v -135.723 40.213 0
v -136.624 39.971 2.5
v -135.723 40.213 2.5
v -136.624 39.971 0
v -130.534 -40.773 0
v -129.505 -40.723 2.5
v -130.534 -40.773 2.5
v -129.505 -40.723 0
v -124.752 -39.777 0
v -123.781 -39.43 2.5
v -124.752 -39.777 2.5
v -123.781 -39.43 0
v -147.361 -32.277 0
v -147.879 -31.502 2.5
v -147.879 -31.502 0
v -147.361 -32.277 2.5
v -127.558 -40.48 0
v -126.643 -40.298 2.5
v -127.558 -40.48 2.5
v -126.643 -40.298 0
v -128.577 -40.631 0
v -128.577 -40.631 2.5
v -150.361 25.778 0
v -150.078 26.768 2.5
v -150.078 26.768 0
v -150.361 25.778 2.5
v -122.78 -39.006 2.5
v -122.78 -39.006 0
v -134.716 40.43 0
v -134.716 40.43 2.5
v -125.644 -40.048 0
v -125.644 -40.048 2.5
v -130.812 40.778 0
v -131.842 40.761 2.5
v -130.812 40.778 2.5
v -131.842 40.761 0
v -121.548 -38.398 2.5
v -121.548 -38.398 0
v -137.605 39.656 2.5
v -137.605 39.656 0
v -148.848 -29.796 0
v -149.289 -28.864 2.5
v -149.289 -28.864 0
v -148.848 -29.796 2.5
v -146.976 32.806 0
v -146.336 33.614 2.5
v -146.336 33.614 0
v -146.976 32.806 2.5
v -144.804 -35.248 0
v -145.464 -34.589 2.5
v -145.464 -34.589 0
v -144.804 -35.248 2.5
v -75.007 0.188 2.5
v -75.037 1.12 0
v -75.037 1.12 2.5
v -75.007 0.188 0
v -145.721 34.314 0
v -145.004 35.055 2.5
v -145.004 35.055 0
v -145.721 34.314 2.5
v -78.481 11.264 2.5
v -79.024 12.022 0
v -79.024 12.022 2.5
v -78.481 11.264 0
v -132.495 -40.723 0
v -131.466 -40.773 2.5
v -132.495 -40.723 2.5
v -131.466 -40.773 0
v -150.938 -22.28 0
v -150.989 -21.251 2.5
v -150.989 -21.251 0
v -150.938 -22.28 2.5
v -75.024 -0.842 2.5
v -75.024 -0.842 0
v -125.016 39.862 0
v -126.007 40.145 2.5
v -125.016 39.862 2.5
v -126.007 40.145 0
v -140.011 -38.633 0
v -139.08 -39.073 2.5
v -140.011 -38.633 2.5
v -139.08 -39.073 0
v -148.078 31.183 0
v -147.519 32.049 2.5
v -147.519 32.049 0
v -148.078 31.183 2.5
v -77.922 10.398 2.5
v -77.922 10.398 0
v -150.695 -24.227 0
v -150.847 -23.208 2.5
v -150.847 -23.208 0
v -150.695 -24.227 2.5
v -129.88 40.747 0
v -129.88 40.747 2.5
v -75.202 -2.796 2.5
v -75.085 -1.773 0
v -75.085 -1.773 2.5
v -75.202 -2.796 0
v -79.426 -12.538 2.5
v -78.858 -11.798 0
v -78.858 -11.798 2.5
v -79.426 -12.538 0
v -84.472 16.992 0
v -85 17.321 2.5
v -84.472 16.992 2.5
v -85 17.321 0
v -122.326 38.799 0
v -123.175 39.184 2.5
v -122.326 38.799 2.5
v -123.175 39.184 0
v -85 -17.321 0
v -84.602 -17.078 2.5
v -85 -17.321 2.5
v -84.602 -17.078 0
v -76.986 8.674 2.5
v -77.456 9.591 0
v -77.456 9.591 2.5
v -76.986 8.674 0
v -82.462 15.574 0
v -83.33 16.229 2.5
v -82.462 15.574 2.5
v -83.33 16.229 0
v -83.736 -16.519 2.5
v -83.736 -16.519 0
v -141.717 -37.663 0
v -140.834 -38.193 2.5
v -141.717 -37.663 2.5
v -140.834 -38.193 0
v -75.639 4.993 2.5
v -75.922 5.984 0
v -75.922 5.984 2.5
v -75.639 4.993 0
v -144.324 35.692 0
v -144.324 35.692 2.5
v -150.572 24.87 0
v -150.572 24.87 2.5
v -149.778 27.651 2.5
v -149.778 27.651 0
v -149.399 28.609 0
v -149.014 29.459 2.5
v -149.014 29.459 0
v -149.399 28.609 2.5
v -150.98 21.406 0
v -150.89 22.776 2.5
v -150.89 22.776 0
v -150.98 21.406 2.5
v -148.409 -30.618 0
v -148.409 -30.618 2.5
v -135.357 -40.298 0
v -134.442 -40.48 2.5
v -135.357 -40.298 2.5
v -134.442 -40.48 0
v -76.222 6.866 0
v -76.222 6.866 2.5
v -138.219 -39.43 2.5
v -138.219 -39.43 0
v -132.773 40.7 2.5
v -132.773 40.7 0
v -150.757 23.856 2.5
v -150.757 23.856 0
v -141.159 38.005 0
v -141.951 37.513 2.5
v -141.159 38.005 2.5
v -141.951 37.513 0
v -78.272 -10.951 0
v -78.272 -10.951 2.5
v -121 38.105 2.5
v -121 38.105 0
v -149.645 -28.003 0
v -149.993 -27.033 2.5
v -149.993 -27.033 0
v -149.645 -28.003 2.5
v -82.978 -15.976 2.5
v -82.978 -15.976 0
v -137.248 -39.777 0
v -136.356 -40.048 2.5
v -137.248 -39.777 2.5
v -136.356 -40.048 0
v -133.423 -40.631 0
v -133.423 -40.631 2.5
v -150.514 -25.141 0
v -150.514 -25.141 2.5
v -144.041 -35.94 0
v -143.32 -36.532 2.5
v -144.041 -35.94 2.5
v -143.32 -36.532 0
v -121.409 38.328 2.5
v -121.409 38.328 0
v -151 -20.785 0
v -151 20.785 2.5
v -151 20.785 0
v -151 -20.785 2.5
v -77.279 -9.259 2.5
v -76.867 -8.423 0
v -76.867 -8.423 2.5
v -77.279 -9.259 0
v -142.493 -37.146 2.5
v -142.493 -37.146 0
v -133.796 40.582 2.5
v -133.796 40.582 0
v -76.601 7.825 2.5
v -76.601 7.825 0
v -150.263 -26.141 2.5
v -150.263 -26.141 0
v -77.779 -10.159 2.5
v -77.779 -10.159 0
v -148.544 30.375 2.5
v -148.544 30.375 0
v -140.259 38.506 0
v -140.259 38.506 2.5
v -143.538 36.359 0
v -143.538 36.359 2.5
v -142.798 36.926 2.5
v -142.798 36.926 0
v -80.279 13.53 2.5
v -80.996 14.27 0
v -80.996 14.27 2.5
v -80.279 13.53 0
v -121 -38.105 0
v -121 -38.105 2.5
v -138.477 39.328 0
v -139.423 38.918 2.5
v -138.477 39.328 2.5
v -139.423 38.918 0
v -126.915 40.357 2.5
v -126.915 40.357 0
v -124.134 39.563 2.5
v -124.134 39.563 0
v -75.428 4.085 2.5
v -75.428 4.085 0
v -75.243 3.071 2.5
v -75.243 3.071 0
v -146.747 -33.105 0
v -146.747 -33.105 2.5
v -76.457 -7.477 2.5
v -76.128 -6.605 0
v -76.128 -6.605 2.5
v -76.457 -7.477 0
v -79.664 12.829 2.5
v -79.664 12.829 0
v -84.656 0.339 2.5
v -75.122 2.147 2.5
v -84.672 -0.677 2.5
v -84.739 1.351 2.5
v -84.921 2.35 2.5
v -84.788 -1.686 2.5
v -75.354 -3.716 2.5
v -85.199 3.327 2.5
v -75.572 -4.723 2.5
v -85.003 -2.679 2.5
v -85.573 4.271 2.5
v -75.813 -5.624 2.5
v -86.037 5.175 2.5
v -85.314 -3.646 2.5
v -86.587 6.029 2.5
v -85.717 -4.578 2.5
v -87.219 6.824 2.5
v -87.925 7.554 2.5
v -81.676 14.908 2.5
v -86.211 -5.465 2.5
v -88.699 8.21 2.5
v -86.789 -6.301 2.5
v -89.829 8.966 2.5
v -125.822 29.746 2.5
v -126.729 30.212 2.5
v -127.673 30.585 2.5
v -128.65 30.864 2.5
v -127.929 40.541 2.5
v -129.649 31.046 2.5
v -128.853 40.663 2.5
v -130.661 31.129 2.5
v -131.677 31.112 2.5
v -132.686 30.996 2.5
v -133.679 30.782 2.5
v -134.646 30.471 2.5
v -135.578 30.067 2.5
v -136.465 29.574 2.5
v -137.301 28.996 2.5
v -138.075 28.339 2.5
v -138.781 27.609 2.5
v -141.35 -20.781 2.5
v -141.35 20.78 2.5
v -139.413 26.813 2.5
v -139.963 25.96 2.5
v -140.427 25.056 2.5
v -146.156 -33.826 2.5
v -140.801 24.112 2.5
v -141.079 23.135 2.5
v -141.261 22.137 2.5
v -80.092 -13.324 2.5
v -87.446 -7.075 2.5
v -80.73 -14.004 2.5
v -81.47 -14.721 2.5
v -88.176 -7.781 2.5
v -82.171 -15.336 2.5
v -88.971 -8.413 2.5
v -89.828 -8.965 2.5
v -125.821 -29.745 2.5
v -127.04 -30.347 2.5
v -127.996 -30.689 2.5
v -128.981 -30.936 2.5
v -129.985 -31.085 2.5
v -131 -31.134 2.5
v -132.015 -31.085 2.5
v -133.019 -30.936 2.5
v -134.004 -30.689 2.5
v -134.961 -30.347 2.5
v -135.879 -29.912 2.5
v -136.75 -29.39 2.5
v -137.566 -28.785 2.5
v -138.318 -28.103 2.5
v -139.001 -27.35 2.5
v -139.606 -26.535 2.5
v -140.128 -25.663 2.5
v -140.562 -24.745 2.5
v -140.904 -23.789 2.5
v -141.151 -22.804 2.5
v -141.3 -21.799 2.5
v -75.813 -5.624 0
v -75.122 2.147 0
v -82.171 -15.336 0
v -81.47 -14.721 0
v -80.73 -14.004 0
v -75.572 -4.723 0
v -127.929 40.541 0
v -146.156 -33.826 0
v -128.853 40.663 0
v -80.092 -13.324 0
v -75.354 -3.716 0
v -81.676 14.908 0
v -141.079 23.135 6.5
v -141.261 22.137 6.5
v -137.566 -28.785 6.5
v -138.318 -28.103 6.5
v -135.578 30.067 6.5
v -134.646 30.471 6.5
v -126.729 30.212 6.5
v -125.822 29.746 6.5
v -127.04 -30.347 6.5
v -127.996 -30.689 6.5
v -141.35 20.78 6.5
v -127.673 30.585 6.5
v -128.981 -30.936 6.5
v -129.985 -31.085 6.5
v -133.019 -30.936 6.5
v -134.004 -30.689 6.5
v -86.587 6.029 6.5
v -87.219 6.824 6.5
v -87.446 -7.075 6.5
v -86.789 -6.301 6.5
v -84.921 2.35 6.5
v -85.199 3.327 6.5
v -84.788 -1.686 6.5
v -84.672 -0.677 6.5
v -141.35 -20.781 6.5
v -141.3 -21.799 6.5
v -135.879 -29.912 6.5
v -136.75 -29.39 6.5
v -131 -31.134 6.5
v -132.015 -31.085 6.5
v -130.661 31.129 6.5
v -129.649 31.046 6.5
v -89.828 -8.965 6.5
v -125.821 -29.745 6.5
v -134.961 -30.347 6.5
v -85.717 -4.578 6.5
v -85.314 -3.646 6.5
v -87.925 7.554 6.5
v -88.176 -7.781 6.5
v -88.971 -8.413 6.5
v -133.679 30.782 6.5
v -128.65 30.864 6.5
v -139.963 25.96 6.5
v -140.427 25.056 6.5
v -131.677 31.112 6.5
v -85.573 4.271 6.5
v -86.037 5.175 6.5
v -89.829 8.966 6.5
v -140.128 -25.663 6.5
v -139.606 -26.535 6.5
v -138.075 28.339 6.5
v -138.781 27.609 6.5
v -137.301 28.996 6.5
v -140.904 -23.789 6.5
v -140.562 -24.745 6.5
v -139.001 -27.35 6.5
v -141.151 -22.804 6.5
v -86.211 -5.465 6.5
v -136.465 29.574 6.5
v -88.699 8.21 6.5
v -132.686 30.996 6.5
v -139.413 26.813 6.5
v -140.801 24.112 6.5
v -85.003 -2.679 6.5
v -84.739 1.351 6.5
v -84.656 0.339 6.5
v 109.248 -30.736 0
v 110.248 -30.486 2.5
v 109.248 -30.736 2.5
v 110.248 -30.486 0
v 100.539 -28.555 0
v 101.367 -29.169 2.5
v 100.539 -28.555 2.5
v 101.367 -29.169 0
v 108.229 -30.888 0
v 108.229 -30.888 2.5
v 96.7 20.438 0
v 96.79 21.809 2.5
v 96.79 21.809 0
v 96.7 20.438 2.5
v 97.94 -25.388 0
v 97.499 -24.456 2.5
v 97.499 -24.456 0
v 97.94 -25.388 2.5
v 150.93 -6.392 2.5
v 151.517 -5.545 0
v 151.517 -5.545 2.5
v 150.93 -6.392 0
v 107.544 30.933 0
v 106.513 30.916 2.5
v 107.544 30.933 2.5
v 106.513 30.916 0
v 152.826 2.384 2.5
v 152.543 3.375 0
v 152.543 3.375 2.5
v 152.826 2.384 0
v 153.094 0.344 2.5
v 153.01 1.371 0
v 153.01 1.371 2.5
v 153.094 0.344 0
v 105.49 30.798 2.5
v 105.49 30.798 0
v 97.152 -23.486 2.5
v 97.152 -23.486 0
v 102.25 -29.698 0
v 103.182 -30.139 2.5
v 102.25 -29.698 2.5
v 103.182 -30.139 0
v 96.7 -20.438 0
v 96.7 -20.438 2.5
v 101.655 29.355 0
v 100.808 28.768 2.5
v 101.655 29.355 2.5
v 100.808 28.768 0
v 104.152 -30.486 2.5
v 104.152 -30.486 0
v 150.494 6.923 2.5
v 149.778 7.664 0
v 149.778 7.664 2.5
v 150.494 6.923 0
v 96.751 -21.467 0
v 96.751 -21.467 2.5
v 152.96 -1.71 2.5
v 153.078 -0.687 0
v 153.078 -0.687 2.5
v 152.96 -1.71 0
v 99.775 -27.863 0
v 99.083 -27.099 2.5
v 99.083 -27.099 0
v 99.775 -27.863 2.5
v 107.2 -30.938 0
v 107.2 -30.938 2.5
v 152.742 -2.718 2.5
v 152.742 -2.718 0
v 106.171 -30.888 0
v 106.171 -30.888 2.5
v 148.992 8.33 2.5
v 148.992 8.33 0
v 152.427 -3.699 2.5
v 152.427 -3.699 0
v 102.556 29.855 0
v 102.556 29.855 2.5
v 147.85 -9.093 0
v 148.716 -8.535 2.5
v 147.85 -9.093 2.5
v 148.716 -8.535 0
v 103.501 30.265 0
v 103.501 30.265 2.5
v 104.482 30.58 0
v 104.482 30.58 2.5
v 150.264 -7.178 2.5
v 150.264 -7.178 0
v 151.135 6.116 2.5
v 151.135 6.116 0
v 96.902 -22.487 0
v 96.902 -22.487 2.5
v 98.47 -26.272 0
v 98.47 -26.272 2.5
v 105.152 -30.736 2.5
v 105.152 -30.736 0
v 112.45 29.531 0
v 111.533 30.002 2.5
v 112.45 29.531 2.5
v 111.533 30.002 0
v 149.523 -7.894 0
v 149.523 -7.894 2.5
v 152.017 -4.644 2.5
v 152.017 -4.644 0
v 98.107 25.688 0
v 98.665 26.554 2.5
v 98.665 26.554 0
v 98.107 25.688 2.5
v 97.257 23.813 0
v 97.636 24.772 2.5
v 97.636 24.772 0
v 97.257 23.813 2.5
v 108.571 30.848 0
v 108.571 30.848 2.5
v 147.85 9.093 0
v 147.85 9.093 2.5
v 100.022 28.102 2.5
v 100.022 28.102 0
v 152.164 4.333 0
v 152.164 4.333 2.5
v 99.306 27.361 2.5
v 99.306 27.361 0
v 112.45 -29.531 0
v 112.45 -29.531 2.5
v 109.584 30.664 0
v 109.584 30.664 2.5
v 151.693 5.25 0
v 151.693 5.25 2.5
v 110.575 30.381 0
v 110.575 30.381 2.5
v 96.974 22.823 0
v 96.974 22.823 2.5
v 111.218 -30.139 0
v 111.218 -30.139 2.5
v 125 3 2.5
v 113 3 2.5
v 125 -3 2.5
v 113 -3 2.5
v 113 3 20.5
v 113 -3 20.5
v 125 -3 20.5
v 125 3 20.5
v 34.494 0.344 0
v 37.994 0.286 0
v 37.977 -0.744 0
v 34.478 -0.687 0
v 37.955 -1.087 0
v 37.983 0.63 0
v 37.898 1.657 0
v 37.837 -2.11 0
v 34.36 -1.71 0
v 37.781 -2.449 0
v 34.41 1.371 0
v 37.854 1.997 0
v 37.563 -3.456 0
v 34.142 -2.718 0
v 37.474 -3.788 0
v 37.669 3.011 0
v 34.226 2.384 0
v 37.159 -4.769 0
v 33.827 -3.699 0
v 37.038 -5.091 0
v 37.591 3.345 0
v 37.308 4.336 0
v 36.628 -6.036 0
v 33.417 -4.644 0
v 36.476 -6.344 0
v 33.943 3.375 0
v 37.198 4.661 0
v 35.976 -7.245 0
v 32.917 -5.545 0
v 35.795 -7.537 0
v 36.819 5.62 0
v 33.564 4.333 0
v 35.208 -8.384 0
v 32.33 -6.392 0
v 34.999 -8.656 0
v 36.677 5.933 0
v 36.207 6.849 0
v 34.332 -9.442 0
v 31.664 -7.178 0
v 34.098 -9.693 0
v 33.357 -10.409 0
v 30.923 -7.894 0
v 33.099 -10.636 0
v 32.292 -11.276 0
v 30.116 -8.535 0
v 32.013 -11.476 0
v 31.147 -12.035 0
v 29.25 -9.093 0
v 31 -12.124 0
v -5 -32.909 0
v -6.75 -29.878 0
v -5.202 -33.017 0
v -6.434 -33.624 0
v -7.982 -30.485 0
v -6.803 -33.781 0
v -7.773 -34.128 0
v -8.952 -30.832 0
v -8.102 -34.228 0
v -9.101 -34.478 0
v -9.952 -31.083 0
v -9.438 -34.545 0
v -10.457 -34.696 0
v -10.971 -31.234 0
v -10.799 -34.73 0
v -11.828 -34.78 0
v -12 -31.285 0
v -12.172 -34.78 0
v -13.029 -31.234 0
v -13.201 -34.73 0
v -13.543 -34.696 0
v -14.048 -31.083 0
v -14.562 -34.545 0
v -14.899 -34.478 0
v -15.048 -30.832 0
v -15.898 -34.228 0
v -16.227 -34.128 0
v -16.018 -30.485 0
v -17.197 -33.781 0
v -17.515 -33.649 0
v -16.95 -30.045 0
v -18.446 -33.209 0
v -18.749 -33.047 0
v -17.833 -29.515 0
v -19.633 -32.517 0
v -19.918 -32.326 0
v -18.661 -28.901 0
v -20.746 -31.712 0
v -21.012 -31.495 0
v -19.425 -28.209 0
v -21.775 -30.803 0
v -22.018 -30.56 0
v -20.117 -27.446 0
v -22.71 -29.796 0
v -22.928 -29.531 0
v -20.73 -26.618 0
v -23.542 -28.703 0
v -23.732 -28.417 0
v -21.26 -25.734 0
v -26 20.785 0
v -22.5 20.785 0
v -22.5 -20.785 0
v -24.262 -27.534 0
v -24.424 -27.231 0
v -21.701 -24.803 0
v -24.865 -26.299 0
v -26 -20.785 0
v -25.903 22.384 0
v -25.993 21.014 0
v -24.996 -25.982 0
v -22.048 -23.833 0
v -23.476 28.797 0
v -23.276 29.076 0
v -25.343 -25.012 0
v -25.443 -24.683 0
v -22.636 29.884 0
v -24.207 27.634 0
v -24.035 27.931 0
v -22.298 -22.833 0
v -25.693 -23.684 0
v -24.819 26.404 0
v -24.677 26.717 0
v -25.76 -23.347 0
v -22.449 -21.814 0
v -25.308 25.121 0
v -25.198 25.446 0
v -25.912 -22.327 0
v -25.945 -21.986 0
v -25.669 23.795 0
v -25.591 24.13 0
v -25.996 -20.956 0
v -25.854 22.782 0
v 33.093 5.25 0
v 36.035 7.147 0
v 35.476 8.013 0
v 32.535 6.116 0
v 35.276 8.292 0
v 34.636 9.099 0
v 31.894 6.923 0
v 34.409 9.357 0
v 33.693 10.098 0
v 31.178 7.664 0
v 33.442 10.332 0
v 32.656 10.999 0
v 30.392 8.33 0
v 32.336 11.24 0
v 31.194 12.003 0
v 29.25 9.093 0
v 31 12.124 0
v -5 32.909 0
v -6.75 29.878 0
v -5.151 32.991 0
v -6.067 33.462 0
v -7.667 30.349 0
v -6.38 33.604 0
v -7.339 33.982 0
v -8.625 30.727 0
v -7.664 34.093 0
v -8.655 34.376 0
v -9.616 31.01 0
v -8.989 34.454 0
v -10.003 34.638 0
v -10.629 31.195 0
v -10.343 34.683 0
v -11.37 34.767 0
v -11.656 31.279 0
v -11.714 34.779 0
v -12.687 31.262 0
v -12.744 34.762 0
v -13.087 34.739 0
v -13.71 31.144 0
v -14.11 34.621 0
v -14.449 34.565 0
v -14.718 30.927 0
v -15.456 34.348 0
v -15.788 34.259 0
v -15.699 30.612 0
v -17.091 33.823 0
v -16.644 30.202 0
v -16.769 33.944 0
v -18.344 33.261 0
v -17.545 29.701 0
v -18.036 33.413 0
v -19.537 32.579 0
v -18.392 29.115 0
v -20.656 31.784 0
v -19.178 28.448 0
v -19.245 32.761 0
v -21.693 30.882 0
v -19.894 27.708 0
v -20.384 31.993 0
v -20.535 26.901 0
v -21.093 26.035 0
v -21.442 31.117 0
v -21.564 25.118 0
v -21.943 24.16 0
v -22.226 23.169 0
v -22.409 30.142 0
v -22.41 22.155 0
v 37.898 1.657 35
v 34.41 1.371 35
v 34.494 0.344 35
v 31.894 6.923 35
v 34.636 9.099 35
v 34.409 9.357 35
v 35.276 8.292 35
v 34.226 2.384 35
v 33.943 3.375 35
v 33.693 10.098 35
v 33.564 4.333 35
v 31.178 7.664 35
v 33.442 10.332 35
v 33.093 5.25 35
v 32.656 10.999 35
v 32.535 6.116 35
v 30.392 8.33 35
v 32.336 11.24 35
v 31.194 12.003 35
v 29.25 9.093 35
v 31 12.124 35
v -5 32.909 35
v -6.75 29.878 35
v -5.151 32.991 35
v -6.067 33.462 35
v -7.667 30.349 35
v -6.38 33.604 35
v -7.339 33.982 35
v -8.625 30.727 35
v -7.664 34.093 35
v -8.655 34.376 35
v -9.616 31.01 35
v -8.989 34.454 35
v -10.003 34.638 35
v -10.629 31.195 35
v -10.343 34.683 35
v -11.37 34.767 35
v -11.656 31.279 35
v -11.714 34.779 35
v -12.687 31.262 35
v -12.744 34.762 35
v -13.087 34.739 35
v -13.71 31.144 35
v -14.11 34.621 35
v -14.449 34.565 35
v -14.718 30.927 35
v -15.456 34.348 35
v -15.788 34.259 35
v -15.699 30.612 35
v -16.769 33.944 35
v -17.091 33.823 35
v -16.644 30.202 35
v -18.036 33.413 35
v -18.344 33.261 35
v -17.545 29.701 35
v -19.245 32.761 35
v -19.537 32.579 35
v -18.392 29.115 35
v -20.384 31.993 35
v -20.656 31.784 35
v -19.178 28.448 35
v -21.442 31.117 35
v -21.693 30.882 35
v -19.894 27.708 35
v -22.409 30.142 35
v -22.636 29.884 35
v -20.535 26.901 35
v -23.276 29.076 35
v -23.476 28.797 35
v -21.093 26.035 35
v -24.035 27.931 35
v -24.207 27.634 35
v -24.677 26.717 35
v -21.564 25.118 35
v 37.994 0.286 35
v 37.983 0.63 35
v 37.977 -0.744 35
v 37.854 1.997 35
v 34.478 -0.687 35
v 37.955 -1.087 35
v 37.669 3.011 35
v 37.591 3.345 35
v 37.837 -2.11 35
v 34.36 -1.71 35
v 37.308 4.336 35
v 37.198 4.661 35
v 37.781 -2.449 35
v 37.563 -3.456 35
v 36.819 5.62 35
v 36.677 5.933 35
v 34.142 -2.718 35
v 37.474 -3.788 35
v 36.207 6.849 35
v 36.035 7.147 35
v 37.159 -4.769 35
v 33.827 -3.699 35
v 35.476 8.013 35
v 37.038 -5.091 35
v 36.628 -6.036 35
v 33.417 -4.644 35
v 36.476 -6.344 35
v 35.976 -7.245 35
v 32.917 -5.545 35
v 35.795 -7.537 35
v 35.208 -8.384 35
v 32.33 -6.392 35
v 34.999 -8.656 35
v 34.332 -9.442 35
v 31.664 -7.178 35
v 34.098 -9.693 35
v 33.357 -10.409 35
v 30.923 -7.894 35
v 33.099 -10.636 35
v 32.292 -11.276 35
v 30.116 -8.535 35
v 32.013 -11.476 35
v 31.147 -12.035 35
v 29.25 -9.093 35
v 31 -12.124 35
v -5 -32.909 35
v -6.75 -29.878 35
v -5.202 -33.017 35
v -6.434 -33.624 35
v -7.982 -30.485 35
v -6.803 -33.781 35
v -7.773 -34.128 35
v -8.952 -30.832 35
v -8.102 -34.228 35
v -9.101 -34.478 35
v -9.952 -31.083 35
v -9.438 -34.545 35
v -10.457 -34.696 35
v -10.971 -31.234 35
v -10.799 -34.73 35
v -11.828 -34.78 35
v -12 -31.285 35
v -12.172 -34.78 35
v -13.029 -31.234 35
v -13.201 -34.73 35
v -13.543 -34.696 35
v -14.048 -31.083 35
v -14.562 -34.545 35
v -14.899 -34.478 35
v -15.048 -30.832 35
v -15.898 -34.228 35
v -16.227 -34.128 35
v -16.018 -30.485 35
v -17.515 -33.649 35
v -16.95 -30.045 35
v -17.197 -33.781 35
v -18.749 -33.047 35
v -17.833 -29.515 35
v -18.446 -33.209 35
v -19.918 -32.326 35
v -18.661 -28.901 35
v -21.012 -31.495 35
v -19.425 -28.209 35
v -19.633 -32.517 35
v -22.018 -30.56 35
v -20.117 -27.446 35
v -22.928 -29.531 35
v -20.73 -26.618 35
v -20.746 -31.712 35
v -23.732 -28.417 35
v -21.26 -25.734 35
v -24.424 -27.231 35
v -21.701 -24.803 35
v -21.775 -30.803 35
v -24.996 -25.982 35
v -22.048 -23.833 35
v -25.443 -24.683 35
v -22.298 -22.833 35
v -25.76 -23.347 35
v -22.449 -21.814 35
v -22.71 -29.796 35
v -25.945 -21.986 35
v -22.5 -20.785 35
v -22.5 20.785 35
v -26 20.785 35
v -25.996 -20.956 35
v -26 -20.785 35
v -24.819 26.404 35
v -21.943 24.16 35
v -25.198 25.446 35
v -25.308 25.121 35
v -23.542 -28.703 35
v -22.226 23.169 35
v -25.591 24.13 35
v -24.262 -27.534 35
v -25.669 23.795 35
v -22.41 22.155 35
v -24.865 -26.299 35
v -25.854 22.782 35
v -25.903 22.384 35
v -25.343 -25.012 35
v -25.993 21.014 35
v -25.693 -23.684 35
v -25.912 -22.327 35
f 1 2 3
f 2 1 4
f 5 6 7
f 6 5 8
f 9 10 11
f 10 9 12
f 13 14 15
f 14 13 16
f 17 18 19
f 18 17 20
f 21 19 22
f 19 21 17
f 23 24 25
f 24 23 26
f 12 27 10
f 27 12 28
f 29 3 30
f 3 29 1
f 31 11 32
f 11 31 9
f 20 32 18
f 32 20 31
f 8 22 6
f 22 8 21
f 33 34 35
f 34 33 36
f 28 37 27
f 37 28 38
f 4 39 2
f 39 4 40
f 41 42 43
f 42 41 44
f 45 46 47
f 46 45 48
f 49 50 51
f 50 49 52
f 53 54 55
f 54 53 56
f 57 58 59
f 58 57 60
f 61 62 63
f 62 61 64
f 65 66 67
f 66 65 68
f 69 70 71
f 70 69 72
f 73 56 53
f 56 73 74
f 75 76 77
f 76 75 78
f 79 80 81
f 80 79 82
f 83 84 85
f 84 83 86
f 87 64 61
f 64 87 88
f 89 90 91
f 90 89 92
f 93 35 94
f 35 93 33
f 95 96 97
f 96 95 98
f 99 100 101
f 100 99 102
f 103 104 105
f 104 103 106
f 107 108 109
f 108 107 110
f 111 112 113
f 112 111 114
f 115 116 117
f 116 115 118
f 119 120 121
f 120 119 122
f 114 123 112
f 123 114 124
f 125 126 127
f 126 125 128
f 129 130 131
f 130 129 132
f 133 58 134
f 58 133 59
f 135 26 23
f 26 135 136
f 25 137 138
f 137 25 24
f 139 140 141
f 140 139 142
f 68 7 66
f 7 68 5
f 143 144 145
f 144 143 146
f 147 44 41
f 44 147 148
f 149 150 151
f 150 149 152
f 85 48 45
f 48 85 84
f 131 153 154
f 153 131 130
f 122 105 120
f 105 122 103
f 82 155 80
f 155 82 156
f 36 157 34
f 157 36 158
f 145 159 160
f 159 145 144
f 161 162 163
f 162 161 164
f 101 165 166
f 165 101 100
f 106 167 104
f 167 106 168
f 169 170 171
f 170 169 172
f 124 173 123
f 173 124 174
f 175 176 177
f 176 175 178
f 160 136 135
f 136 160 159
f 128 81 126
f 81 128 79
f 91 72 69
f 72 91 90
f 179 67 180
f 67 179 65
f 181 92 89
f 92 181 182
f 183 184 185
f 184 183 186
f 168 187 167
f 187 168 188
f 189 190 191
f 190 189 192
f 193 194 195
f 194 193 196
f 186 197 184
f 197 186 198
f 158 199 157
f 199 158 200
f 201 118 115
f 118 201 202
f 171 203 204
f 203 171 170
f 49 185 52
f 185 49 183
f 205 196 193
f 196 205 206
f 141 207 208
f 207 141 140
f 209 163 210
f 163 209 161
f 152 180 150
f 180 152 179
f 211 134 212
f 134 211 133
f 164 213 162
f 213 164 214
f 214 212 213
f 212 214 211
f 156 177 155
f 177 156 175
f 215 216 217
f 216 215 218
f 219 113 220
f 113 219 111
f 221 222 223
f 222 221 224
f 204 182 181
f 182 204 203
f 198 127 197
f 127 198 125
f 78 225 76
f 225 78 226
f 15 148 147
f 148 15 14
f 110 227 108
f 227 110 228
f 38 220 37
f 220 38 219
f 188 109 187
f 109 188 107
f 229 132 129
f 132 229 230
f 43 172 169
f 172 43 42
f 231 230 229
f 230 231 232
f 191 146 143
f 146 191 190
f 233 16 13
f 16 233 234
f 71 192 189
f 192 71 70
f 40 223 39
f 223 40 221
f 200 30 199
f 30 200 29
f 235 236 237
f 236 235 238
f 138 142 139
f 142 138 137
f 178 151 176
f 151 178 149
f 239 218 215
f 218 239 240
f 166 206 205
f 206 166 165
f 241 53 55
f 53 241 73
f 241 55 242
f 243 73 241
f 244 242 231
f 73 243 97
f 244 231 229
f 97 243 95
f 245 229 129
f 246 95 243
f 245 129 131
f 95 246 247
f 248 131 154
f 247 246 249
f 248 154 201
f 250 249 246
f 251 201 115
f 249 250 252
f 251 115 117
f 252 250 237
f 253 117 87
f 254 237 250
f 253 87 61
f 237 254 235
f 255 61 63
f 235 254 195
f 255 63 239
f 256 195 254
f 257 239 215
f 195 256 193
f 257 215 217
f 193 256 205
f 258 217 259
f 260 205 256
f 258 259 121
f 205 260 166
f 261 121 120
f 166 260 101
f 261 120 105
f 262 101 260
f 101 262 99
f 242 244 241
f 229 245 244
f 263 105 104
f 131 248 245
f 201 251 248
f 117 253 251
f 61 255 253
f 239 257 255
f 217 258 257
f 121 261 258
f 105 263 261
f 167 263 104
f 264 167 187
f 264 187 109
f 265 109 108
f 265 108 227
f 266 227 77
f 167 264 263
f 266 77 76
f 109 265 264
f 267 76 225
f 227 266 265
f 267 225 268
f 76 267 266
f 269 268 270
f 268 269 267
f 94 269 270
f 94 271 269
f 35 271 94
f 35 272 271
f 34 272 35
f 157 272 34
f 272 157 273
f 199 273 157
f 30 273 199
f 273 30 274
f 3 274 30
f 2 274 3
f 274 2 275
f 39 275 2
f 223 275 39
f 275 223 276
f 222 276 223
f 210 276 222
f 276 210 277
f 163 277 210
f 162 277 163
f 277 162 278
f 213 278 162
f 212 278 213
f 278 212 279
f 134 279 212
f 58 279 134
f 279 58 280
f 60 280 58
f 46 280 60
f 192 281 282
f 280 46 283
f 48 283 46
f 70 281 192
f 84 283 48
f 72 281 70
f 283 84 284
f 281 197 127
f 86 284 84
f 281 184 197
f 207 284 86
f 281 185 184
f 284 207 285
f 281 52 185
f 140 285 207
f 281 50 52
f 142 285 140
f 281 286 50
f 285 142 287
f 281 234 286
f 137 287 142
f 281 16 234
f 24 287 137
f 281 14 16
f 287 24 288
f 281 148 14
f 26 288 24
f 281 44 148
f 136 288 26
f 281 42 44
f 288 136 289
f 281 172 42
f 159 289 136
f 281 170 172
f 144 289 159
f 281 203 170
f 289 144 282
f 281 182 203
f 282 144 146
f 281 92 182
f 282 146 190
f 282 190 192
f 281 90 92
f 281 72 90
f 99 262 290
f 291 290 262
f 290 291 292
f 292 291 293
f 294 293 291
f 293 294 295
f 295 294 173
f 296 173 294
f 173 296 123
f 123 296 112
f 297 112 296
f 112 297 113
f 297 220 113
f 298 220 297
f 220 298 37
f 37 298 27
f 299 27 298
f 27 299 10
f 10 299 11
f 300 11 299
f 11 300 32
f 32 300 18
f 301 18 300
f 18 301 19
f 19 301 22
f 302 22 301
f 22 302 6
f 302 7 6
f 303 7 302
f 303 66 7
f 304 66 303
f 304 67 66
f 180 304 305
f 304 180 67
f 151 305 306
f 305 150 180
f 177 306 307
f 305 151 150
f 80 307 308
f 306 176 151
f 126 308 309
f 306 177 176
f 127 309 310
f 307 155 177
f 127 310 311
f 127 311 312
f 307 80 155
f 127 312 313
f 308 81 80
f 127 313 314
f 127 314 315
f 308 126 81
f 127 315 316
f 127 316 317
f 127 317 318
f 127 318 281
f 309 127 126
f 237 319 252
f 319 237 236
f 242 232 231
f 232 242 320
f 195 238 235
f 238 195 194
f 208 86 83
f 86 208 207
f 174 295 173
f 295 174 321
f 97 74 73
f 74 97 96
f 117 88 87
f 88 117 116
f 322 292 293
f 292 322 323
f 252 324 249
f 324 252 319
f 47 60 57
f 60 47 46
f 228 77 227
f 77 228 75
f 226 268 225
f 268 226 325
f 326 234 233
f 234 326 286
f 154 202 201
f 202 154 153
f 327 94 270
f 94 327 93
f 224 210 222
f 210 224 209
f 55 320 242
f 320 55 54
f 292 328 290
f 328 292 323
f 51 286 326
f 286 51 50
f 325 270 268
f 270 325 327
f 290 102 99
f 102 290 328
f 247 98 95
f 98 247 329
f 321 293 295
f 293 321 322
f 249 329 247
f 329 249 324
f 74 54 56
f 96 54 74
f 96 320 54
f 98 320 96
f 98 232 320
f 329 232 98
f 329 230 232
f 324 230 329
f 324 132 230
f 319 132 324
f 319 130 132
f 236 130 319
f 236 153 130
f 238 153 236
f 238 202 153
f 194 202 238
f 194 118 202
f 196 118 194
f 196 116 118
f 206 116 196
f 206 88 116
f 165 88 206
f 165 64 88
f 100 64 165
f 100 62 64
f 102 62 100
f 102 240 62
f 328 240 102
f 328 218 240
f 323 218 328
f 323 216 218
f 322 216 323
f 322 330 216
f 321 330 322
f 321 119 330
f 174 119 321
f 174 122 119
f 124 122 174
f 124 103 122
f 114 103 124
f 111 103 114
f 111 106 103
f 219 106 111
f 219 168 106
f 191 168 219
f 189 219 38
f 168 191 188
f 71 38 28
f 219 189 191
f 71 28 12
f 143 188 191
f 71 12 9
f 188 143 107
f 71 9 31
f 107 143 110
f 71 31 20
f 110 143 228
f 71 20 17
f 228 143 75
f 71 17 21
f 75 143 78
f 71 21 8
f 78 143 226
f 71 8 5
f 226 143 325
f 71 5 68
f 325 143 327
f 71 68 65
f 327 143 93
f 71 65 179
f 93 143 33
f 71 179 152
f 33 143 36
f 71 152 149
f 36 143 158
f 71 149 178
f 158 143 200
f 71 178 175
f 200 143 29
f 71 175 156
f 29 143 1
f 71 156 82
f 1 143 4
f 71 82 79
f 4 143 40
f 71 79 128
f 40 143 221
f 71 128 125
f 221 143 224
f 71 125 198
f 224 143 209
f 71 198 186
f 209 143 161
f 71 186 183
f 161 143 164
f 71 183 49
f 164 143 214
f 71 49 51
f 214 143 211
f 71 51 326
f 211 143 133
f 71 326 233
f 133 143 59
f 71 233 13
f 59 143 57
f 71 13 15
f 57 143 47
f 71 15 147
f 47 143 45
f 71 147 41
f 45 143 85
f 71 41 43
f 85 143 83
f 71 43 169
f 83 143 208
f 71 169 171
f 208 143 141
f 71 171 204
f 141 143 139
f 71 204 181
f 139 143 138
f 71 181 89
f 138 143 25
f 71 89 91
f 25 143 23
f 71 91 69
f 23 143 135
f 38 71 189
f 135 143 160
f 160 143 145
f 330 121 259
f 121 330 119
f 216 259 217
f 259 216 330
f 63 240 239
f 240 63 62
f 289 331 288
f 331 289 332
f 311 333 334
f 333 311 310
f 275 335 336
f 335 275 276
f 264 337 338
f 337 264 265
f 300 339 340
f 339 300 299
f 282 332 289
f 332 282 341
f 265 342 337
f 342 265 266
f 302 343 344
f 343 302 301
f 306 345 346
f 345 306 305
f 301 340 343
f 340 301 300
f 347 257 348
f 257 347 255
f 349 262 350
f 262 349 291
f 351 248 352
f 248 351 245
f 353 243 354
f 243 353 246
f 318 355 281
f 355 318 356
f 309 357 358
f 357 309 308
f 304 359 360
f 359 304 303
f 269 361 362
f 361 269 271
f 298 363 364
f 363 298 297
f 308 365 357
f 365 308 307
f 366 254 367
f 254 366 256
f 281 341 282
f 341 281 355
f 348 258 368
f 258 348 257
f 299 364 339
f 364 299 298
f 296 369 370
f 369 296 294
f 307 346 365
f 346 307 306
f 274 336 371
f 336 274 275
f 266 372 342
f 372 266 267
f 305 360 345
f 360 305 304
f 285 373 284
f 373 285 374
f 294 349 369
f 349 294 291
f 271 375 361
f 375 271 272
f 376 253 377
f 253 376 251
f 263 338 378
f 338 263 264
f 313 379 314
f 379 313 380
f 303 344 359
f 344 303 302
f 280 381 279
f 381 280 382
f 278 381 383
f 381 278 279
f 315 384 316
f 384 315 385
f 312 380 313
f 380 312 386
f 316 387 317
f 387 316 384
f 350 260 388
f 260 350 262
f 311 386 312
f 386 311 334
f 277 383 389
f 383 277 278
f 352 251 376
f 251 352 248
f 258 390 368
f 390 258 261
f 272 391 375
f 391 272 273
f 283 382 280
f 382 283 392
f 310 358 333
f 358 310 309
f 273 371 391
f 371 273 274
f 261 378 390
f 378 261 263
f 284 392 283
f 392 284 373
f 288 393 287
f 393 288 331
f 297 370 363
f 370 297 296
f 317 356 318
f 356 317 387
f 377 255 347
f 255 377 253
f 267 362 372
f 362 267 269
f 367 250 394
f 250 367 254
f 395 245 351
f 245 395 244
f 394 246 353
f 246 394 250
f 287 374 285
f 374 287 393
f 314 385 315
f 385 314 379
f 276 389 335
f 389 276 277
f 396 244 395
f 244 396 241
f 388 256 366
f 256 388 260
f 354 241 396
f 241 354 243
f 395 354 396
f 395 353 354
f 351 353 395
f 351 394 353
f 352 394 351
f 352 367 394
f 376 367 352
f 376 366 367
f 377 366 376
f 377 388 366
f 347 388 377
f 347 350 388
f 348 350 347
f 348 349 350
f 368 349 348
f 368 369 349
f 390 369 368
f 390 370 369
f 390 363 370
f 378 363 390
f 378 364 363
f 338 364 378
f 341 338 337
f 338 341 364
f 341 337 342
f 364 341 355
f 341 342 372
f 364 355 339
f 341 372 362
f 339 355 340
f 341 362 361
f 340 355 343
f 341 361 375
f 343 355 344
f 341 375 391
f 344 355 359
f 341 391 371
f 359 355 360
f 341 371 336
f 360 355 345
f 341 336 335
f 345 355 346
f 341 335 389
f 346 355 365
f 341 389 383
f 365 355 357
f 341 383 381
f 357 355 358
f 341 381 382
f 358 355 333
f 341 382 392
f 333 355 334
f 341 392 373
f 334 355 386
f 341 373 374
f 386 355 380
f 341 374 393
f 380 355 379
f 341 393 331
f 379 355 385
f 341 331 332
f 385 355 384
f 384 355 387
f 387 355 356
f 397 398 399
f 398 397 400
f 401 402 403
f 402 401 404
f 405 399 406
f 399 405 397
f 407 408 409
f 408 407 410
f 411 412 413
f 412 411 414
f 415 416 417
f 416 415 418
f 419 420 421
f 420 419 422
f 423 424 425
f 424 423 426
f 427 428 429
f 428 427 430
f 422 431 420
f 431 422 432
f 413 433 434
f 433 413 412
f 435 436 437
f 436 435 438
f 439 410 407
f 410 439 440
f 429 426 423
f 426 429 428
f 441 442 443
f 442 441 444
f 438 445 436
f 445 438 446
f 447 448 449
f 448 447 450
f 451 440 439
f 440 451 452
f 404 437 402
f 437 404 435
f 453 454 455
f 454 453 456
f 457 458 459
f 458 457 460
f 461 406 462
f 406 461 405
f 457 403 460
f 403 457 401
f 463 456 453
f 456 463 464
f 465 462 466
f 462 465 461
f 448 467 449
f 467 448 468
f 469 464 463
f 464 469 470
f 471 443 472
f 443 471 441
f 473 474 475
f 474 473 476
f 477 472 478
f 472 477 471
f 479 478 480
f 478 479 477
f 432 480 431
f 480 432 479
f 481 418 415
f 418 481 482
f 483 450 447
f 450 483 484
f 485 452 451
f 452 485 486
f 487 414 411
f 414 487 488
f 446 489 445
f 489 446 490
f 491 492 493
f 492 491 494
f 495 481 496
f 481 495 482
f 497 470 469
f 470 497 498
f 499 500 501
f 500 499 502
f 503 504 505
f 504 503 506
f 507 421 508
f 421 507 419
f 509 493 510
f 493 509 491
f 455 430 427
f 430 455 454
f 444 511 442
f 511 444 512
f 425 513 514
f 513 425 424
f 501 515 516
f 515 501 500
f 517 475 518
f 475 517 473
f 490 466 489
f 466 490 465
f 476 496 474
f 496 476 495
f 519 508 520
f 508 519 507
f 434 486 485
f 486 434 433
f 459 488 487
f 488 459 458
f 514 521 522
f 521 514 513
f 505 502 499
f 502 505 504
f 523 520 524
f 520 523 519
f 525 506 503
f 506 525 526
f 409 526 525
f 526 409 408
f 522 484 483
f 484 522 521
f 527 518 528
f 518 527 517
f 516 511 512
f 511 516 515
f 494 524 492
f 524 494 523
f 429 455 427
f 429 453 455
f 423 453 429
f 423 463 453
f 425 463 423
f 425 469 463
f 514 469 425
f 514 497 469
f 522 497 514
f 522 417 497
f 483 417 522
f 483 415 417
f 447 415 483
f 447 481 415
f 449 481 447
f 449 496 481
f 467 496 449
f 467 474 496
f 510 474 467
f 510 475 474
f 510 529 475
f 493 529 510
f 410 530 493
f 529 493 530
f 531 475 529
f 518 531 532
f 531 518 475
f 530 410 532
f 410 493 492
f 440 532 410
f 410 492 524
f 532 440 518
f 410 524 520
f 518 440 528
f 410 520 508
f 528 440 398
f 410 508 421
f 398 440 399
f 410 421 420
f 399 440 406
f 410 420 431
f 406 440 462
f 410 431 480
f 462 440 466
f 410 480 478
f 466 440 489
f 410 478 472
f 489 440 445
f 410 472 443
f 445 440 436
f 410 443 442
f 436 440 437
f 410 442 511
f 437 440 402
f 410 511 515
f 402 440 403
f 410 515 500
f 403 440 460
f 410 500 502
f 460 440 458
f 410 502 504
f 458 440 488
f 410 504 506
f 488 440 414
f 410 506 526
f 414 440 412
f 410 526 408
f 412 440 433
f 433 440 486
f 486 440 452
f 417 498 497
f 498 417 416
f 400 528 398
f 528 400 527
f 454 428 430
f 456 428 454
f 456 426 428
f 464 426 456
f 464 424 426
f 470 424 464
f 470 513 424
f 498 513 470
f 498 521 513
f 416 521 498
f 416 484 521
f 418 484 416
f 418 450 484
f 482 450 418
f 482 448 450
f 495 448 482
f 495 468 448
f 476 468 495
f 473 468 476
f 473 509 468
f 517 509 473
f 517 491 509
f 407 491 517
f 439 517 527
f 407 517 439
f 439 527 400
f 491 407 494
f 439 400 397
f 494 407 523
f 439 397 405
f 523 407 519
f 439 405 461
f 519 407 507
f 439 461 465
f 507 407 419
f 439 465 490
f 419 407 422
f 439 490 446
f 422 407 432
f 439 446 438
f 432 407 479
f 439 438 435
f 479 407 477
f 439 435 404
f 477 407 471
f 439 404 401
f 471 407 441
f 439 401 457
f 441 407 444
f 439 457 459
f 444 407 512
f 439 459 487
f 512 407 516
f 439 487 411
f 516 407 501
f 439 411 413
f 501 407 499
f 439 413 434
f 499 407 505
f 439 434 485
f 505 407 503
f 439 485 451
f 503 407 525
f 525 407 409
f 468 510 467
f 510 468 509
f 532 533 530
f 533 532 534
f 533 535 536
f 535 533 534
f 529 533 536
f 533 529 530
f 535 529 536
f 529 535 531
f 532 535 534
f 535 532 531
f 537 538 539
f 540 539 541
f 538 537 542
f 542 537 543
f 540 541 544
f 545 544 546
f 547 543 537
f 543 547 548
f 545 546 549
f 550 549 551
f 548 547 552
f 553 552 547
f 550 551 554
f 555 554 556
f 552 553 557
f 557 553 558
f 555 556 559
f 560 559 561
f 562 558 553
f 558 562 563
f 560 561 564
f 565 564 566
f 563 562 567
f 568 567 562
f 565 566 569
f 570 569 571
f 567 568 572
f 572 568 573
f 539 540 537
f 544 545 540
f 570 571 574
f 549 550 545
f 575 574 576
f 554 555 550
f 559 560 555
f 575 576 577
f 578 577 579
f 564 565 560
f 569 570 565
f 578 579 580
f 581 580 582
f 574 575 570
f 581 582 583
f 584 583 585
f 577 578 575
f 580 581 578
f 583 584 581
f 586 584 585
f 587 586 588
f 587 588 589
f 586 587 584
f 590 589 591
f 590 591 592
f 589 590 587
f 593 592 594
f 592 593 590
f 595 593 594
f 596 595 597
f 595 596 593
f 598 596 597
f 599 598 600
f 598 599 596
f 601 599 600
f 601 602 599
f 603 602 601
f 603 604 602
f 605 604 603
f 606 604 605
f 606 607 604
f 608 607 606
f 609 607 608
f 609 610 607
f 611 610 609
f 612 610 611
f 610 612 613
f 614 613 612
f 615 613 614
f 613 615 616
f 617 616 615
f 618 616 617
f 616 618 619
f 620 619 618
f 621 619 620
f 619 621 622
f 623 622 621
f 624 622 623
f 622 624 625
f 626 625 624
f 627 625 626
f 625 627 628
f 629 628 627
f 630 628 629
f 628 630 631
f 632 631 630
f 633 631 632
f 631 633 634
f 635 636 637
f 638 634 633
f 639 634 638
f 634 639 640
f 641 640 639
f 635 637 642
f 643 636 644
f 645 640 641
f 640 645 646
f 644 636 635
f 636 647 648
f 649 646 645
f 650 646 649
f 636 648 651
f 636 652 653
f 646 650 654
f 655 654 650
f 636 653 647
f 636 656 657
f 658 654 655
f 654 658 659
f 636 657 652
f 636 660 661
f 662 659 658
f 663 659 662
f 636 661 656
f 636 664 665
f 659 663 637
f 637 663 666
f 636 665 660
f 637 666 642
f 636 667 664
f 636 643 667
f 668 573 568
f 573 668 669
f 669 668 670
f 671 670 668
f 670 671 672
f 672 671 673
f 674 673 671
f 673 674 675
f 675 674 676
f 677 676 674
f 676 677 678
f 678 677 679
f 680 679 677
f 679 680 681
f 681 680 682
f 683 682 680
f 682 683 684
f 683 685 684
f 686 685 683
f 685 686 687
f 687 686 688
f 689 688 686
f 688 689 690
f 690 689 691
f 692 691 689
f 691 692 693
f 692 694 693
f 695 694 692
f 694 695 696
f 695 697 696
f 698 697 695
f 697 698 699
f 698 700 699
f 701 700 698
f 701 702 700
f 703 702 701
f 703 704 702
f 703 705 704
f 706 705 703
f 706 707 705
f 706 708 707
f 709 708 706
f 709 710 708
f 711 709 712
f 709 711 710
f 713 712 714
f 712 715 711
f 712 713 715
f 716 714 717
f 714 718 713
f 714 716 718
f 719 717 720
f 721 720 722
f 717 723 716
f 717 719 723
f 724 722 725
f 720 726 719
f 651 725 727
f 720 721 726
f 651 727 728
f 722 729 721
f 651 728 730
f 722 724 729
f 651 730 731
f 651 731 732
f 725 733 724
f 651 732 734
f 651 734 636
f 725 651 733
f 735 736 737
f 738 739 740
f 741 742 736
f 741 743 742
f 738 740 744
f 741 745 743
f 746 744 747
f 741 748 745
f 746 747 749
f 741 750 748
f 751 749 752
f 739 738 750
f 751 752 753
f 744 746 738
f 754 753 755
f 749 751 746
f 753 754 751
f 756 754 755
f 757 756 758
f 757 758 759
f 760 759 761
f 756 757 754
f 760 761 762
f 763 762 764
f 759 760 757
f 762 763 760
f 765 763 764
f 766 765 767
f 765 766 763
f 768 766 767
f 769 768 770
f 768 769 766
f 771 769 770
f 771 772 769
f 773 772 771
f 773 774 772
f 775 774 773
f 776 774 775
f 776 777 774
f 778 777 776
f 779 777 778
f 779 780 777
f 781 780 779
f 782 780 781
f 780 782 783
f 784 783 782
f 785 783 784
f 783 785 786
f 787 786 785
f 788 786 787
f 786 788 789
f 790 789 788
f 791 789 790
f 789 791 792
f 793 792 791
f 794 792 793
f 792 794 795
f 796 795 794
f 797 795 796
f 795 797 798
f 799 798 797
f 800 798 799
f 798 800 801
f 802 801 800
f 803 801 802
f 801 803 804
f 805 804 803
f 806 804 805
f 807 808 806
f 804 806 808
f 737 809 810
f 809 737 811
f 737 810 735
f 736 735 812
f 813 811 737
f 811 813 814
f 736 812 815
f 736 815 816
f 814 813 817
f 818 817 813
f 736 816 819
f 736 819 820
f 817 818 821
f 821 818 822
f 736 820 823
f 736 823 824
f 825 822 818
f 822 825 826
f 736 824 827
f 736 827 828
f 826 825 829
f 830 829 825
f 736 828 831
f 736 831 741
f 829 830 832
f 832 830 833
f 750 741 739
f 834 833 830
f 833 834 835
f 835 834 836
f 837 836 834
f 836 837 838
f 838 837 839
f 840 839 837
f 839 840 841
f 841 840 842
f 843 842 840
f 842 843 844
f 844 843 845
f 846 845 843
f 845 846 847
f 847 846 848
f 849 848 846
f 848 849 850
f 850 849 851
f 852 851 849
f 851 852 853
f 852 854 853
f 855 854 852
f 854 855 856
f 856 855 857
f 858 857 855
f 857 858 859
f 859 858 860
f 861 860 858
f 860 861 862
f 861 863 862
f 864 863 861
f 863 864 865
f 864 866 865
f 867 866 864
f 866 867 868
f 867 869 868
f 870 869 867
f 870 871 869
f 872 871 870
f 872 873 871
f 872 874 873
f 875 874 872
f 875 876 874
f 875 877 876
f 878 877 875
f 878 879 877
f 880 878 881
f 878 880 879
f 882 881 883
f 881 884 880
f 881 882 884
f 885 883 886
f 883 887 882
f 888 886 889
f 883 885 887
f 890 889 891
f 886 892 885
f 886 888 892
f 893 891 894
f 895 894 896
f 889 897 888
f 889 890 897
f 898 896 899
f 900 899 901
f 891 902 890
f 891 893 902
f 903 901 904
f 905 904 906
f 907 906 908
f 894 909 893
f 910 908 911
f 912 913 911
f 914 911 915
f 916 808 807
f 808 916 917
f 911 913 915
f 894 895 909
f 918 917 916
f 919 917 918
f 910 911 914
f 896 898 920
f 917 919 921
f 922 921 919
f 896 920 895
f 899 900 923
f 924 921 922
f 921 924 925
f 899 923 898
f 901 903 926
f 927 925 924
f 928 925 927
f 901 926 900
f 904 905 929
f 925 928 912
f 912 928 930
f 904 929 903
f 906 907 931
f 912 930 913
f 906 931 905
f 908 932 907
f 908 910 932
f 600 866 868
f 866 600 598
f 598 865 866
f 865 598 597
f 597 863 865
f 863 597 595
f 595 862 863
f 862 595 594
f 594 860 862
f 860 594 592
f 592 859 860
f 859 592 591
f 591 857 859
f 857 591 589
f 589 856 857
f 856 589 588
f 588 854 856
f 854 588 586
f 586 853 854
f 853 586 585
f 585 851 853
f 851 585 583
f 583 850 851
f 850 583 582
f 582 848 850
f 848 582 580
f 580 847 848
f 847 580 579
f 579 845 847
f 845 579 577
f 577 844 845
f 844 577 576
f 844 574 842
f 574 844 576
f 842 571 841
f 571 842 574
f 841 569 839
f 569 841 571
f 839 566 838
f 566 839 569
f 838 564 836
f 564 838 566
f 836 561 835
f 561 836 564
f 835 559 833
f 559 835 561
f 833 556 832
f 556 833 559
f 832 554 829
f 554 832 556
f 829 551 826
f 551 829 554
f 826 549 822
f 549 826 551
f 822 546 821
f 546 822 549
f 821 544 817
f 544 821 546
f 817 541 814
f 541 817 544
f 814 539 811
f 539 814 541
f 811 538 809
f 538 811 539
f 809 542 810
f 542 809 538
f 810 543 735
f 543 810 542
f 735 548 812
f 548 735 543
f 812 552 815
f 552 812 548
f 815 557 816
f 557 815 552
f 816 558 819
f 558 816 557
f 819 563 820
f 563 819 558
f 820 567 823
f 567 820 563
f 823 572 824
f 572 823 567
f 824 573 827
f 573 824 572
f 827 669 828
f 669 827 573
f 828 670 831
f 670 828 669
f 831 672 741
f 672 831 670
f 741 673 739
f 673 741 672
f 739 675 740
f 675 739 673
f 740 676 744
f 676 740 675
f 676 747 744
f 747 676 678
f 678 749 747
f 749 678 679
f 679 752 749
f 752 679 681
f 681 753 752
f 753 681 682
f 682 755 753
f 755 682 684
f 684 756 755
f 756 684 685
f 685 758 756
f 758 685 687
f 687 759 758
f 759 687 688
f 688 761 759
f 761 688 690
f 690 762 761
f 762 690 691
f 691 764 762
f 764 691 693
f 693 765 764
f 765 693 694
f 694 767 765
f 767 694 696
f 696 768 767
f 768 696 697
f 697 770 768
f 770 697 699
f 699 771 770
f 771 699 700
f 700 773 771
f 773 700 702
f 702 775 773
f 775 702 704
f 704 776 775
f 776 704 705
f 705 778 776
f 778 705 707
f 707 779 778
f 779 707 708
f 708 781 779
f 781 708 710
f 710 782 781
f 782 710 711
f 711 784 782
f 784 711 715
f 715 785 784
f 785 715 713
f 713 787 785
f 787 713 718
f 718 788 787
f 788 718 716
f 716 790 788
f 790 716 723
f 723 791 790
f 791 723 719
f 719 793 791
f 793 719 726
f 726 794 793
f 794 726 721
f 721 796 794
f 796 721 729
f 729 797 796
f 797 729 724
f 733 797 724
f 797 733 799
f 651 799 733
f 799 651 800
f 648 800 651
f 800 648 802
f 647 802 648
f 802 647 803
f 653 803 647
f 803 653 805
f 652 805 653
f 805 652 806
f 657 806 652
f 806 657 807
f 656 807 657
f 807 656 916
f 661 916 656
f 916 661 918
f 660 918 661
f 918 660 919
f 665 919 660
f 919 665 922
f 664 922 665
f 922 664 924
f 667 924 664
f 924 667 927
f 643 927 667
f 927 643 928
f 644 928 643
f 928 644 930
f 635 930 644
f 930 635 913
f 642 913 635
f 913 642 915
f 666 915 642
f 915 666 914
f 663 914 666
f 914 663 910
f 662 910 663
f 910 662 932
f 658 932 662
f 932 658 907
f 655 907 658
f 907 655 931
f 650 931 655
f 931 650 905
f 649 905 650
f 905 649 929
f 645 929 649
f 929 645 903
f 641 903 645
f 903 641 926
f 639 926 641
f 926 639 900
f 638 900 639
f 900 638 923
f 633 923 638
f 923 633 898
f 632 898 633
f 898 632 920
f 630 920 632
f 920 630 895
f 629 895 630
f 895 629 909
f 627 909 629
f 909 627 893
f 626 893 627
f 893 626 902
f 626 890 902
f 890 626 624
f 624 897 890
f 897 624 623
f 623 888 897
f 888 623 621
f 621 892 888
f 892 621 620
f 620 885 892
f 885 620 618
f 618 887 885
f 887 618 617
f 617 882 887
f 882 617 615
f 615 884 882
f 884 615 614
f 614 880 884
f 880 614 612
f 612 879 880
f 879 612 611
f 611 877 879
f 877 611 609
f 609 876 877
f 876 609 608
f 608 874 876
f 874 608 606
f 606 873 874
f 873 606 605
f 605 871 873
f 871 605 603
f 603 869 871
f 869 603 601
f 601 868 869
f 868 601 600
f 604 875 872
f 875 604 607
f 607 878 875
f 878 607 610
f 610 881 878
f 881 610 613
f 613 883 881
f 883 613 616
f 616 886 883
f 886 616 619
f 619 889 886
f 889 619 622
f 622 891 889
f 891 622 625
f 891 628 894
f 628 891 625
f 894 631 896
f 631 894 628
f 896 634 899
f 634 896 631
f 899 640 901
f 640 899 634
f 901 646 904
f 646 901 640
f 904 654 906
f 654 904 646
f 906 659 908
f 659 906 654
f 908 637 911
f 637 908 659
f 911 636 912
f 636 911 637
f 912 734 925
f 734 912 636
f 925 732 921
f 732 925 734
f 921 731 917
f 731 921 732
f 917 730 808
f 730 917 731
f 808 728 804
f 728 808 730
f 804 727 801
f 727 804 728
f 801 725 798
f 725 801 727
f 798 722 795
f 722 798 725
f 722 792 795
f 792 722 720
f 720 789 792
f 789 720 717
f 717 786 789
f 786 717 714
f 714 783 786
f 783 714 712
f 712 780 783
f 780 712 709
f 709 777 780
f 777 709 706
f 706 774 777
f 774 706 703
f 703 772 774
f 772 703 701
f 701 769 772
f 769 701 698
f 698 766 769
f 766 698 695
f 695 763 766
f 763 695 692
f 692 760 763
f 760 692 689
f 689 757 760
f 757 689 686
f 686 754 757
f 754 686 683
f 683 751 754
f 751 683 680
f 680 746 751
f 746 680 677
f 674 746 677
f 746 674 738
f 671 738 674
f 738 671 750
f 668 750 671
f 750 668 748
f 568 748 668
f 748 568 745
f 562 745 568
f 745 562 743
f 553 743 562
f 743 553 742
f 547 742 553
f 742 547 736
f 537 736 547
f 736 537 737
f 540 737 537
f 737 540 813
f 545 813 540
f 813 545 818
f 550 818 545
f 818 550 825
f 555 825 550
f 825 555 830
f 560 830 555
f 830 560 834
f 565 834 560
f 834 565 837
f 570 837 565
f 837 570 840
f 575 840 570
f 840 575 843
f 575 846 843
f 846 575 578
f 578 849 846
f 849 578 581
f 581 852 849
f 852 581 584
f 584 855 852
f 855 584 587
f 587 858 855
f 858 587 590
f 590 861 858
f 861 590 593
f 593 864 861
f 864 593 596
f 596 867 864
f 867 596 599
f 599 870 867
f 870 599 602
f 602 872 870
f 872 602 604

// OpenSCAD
// Onigiri rice mold: base with lip, outer ring, and press with handle.
// One printable plate. Check edge cases with scripts/check-models.sh.
// All sizes in mm. The stl-creator app overrides these with -D.

diameter = 90; // rice cavity width (inner opening of the ring)
height = 35; // ring / rice thickness
corners = 3; // 3 = classic triangle, up to 5

wall = 3.5;
clearance = 0.4; // press sits loose inside the ring
base_t = 2.5;
lip_h = 4;
plate_margin = 6; // base plate beyond the ring
handle_w = 12;
handle_d = 6;
handle_h = 18;
gap = 10; // space between parts on the plate

$fn = 64;

assert(corners >= 3 && corners <= 5, "corners must be 3, 4 or 5");

// Corner radius: scales with size; capped so small shapes stay pointy enough.
corner_r = min(diameter * 0.2, diameter * 0.35 / corners);

// Rounded regular n-gon whose overall width is about `d`.
module profile(d) {
  offset(r = corner_r)
    offset(delta = -corner_r)
      circle(d = d, $fn = corners);
}

module ring() {
  linear_extrude(height)
    difference() {
      offset(r = wall) profile(diameter);
      profile(diameter);
    }
}

module base() {
  // Flat plate wider than the ring, plus a lip the ring sits over.
  linear_extrude(base_t)
    offset(r = wall + plate_margin) profile(diameter);
  translate([0, 0, base_t])
    linear_extrude(lip_h)
      offset(r = -0.15) profile(diameter);
}

module press() {
  inner = diameter - 2 * clearance;
  linear_extrude(base_t)
    profile(inner);
  // Handle across the short axis of the shape
  translate([0, 0, base_t])
    linear_extrude(handle_h)
      square([handle_w, handle_d], center = true);
}

// Footprint width of one part (ring is the widest).
part_w = diameter + 2 * wall + 2 * plate_margin;
step = part_w + gap;

translate([-step, 0, 0]) base();
ring();
translate([step, 0, 0]) press();
